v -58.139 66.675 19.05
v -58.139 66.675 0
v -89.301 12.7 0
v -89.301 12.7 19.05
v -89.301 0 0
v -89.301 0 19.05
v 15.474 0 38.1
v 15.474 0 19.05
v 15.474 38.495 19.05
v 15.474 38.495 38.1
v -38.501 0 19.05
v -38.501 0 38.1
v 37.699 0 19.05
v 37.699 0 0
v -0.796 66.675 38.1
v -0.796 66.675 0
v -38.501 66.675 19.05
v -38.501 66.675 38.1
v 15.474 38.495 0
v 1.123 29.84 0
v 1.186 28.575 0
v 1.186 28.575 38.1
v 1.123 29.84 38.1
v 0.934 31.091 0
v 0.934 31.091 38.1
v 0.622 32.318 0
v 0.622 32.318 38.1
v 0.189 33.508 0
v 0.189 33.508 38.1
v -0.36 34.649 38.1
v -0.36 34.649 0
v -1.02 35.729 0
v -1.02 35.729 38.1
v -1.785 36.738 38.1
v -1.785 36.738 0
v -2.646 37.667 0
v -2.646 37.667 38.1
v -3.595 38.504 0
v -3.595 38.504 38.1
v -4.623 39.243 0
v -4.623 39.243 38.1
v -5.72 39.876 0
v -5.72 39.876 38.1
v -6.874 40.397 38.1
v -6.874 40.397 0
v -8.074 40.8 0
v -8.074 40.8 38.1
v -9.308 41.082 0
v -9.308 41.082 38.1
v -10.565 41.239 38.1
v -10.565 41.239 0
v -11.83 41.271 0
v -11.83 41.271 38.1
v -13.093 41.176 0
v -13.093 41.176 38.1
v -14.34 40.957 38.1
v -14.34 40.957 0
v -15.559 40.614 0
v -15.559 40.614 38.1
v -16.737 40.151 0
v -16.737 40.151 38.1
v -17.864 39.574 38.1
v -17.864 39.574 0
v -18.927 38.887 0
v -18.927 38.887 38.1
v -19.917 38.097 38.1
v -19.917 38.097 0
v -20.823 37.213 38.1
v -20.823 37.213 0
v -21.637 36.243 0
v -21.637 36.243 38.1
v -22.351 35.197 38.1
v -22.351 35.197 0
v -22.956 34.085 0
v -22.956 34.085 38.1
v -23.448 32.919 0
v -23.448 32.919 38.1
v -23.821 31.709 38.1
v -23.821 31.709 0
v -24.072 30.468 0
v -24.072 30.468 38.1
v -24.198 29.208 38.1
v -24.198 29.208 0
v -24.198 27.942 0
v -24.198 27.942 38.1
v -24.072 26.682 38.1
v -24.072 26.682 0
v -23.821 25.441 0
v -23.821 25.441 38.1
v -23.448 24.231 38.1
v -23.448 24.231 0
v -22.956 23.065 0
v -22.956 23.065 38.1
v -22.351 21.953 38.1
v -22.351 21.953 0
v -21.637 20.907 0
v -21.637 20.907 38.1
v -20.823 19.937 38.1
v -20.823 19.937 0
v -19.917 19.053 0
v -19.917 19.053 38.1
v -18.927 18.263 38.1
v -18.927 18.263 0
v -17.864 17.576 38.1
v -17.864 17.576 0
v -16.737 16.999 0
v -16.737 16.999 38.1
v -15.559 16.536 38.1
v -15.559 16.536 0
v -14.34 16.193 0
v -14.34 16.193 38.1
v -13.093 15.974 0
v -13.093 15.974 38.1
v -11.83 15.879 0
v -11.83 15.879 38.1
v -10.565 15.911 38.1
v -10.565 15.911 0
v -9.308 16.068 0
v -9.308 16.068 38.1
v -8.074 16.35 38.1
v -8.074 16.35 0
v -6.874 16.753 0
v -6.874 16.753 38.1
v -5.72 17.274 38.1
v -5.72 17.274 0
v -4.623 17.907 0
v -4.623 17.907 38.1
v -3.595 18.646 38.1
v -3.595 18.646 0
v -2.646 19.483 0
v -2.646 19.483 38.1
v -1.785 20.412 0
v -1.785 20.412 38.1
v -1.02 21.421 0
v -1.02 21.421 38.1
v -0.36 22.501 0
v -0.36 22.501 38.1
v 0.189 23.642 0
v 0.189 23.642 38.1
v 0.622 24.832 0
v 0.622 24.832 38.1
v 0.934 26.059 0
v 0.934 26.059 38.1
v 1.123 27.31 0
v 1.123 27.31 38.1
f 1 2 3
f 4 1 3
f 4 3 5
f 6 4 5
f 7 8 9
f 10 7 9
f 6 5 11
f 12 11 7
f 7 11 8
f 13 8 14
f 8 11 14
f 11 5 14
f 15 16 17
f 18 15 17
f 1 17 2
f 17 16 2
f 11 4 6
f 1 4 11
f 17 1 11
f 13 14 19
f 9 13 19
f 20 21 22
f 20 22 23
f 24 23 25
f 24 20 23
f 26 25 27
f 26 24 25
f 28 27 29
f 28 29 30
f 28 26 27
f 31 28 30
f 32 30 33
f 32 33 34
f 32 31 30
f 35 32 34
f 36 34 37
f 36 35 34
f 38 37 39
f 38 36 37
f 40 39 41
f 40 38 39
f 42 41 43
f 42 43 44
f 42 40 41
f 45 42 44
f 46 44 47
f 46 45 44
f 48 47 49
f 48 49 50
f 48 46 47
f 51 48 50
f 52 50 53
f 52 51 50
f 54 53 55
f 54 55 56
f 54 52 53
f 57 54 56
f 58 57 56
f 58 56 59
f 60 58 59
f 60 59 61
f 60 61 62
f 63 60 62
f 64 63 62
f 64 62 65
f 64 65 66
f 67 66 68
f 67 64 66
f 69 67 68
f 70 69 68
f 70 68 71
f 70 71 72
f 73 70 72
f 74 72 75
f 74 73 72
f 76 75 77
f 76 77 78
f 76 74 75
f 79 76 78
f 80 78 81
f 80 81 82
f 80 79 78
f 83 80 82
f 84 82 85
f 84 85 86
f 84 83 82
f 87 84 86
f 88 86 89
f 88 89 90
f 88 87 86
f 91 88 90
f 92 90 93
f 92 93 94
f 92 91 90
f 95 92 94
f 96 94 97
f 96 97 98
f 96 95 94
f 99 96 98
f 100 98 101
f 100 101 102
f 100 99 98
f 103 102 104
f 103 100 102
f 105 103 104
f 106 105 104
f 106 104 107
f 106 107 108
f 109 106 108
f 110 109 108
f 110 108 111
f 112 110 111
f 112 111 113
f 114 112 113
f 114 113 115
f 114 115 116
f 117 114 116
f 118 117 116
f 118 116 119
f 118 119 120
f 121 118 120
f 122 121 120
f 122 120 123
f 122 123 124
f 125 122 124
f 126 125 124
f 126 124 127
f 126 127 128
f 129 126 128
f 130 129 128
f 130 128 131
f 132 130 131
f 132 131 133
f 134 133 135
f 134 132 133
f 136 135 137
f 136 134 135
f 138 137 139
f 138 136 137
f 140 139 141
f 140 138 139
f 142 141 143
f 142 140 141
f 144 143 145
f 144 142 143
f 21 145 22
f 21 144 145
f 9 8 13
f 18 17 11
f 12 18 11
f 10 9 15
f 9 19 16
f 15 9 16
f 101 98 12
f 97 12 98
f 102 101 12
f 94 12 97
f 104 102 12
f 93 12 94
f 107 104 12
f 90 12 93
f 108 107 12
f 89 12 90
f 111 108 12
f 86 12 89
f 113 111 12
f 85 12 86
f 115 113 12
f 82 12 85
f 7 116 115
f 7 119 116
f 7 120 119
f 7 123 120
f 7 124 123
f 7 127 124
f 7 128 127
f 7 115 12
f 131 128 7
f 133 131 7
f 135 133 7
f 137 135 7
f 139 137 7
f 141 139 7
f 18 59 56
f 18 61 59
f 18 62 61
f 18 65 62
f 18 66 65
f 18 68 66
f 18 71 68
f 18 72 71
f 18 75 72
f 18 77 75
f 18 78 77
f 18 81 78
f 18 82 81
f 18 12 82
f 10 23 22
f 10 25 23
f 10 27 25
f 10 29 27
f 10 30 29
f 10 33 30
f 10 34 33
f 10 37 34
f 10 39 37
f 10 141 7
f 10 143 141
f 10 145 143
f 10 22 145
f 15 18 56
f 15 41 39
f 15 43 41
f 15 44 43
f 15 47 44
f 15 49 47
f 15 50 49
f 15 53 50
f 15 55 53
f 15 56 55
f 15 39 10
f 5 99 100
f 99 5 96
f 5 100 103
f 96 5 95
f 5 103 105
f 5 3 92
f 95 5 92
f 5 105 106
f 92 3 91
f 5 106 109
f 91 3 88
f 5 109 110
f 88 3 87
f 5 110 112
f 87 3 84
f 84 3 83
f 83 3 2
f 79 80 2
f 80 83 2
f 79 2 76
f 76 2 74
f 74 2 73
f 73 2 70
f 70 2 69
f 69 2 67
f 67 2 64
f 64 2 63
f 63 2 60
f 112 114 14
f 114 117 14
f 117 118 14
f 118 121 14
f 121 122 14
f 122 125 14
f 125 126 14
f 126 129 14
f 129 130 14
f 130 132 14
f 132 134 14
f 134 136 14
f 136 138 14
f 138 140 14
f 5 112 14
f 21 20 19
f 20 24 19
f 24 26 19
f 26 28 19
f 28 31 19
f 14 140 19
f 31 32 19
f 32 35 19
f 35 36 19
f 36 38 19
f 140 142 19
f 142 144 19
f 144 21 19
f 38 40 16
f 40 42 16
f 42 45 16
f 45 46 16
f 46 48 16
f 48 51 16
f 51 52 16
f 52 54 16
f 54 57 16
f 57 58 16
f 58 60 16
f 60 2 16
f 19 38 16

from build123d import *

# Parameters (mm, degrees)
BOSS_EXTRUDE1_DEPTH   = 19.05
BOSS_EXTRUDE1_2_DEPTH = 19.05
SKETCH1_3_R           = 12.7
BOSS_EXTRUDE2_DEPTH   = 38.1


with BuildPart() as part:
    # Sketch1 → Boss-Extrude1 (new body)
    with BuildSketch(Plane.XY):
        Polygon((-58.138751056, 66.675), (-89.301231836, 12.7), (-89.301231836, 0), (-38.501231836, 0), (-38.501231836, 66.675), align=None)
    extrude(amount=BOSS_EXTRUDE1_DEPTH)



with BuildPart() as body_2:
    # Sketch1 → Boss-Extrude1 2 (new body)
    with BuildSketch(Plane.XY):
        Polygon((15.473768164, 38.494829198), (15.473768164, 0), (37.698768164, 0), align=None)
    extrude(amount=BOSS_EXTRUDE1_2_DEPTH)


with BuildPart() as part_1:
    add(part.part)

    add(body_2.part)  # Boss-Extrude2 merges body 2
    # Sketch1<3> → Boss-Extrude2 (add)
    with BuildSketch(Plane.XY):
        Polygon((-38.501231836, 66.675), (-38.501231836, 0), (15.473768164, 0), (15.473768164, 38.494829198), (-0.796061034, 66.675), align=None)
        with Locations((-11.513731836, 28.575)):
            Circle(SKETCH1_3_R, mode=Mode.SUBTRACT)
    extrude(amount=BOSS_EXTRUDE2_DEPTH)


solid = part_1.part
